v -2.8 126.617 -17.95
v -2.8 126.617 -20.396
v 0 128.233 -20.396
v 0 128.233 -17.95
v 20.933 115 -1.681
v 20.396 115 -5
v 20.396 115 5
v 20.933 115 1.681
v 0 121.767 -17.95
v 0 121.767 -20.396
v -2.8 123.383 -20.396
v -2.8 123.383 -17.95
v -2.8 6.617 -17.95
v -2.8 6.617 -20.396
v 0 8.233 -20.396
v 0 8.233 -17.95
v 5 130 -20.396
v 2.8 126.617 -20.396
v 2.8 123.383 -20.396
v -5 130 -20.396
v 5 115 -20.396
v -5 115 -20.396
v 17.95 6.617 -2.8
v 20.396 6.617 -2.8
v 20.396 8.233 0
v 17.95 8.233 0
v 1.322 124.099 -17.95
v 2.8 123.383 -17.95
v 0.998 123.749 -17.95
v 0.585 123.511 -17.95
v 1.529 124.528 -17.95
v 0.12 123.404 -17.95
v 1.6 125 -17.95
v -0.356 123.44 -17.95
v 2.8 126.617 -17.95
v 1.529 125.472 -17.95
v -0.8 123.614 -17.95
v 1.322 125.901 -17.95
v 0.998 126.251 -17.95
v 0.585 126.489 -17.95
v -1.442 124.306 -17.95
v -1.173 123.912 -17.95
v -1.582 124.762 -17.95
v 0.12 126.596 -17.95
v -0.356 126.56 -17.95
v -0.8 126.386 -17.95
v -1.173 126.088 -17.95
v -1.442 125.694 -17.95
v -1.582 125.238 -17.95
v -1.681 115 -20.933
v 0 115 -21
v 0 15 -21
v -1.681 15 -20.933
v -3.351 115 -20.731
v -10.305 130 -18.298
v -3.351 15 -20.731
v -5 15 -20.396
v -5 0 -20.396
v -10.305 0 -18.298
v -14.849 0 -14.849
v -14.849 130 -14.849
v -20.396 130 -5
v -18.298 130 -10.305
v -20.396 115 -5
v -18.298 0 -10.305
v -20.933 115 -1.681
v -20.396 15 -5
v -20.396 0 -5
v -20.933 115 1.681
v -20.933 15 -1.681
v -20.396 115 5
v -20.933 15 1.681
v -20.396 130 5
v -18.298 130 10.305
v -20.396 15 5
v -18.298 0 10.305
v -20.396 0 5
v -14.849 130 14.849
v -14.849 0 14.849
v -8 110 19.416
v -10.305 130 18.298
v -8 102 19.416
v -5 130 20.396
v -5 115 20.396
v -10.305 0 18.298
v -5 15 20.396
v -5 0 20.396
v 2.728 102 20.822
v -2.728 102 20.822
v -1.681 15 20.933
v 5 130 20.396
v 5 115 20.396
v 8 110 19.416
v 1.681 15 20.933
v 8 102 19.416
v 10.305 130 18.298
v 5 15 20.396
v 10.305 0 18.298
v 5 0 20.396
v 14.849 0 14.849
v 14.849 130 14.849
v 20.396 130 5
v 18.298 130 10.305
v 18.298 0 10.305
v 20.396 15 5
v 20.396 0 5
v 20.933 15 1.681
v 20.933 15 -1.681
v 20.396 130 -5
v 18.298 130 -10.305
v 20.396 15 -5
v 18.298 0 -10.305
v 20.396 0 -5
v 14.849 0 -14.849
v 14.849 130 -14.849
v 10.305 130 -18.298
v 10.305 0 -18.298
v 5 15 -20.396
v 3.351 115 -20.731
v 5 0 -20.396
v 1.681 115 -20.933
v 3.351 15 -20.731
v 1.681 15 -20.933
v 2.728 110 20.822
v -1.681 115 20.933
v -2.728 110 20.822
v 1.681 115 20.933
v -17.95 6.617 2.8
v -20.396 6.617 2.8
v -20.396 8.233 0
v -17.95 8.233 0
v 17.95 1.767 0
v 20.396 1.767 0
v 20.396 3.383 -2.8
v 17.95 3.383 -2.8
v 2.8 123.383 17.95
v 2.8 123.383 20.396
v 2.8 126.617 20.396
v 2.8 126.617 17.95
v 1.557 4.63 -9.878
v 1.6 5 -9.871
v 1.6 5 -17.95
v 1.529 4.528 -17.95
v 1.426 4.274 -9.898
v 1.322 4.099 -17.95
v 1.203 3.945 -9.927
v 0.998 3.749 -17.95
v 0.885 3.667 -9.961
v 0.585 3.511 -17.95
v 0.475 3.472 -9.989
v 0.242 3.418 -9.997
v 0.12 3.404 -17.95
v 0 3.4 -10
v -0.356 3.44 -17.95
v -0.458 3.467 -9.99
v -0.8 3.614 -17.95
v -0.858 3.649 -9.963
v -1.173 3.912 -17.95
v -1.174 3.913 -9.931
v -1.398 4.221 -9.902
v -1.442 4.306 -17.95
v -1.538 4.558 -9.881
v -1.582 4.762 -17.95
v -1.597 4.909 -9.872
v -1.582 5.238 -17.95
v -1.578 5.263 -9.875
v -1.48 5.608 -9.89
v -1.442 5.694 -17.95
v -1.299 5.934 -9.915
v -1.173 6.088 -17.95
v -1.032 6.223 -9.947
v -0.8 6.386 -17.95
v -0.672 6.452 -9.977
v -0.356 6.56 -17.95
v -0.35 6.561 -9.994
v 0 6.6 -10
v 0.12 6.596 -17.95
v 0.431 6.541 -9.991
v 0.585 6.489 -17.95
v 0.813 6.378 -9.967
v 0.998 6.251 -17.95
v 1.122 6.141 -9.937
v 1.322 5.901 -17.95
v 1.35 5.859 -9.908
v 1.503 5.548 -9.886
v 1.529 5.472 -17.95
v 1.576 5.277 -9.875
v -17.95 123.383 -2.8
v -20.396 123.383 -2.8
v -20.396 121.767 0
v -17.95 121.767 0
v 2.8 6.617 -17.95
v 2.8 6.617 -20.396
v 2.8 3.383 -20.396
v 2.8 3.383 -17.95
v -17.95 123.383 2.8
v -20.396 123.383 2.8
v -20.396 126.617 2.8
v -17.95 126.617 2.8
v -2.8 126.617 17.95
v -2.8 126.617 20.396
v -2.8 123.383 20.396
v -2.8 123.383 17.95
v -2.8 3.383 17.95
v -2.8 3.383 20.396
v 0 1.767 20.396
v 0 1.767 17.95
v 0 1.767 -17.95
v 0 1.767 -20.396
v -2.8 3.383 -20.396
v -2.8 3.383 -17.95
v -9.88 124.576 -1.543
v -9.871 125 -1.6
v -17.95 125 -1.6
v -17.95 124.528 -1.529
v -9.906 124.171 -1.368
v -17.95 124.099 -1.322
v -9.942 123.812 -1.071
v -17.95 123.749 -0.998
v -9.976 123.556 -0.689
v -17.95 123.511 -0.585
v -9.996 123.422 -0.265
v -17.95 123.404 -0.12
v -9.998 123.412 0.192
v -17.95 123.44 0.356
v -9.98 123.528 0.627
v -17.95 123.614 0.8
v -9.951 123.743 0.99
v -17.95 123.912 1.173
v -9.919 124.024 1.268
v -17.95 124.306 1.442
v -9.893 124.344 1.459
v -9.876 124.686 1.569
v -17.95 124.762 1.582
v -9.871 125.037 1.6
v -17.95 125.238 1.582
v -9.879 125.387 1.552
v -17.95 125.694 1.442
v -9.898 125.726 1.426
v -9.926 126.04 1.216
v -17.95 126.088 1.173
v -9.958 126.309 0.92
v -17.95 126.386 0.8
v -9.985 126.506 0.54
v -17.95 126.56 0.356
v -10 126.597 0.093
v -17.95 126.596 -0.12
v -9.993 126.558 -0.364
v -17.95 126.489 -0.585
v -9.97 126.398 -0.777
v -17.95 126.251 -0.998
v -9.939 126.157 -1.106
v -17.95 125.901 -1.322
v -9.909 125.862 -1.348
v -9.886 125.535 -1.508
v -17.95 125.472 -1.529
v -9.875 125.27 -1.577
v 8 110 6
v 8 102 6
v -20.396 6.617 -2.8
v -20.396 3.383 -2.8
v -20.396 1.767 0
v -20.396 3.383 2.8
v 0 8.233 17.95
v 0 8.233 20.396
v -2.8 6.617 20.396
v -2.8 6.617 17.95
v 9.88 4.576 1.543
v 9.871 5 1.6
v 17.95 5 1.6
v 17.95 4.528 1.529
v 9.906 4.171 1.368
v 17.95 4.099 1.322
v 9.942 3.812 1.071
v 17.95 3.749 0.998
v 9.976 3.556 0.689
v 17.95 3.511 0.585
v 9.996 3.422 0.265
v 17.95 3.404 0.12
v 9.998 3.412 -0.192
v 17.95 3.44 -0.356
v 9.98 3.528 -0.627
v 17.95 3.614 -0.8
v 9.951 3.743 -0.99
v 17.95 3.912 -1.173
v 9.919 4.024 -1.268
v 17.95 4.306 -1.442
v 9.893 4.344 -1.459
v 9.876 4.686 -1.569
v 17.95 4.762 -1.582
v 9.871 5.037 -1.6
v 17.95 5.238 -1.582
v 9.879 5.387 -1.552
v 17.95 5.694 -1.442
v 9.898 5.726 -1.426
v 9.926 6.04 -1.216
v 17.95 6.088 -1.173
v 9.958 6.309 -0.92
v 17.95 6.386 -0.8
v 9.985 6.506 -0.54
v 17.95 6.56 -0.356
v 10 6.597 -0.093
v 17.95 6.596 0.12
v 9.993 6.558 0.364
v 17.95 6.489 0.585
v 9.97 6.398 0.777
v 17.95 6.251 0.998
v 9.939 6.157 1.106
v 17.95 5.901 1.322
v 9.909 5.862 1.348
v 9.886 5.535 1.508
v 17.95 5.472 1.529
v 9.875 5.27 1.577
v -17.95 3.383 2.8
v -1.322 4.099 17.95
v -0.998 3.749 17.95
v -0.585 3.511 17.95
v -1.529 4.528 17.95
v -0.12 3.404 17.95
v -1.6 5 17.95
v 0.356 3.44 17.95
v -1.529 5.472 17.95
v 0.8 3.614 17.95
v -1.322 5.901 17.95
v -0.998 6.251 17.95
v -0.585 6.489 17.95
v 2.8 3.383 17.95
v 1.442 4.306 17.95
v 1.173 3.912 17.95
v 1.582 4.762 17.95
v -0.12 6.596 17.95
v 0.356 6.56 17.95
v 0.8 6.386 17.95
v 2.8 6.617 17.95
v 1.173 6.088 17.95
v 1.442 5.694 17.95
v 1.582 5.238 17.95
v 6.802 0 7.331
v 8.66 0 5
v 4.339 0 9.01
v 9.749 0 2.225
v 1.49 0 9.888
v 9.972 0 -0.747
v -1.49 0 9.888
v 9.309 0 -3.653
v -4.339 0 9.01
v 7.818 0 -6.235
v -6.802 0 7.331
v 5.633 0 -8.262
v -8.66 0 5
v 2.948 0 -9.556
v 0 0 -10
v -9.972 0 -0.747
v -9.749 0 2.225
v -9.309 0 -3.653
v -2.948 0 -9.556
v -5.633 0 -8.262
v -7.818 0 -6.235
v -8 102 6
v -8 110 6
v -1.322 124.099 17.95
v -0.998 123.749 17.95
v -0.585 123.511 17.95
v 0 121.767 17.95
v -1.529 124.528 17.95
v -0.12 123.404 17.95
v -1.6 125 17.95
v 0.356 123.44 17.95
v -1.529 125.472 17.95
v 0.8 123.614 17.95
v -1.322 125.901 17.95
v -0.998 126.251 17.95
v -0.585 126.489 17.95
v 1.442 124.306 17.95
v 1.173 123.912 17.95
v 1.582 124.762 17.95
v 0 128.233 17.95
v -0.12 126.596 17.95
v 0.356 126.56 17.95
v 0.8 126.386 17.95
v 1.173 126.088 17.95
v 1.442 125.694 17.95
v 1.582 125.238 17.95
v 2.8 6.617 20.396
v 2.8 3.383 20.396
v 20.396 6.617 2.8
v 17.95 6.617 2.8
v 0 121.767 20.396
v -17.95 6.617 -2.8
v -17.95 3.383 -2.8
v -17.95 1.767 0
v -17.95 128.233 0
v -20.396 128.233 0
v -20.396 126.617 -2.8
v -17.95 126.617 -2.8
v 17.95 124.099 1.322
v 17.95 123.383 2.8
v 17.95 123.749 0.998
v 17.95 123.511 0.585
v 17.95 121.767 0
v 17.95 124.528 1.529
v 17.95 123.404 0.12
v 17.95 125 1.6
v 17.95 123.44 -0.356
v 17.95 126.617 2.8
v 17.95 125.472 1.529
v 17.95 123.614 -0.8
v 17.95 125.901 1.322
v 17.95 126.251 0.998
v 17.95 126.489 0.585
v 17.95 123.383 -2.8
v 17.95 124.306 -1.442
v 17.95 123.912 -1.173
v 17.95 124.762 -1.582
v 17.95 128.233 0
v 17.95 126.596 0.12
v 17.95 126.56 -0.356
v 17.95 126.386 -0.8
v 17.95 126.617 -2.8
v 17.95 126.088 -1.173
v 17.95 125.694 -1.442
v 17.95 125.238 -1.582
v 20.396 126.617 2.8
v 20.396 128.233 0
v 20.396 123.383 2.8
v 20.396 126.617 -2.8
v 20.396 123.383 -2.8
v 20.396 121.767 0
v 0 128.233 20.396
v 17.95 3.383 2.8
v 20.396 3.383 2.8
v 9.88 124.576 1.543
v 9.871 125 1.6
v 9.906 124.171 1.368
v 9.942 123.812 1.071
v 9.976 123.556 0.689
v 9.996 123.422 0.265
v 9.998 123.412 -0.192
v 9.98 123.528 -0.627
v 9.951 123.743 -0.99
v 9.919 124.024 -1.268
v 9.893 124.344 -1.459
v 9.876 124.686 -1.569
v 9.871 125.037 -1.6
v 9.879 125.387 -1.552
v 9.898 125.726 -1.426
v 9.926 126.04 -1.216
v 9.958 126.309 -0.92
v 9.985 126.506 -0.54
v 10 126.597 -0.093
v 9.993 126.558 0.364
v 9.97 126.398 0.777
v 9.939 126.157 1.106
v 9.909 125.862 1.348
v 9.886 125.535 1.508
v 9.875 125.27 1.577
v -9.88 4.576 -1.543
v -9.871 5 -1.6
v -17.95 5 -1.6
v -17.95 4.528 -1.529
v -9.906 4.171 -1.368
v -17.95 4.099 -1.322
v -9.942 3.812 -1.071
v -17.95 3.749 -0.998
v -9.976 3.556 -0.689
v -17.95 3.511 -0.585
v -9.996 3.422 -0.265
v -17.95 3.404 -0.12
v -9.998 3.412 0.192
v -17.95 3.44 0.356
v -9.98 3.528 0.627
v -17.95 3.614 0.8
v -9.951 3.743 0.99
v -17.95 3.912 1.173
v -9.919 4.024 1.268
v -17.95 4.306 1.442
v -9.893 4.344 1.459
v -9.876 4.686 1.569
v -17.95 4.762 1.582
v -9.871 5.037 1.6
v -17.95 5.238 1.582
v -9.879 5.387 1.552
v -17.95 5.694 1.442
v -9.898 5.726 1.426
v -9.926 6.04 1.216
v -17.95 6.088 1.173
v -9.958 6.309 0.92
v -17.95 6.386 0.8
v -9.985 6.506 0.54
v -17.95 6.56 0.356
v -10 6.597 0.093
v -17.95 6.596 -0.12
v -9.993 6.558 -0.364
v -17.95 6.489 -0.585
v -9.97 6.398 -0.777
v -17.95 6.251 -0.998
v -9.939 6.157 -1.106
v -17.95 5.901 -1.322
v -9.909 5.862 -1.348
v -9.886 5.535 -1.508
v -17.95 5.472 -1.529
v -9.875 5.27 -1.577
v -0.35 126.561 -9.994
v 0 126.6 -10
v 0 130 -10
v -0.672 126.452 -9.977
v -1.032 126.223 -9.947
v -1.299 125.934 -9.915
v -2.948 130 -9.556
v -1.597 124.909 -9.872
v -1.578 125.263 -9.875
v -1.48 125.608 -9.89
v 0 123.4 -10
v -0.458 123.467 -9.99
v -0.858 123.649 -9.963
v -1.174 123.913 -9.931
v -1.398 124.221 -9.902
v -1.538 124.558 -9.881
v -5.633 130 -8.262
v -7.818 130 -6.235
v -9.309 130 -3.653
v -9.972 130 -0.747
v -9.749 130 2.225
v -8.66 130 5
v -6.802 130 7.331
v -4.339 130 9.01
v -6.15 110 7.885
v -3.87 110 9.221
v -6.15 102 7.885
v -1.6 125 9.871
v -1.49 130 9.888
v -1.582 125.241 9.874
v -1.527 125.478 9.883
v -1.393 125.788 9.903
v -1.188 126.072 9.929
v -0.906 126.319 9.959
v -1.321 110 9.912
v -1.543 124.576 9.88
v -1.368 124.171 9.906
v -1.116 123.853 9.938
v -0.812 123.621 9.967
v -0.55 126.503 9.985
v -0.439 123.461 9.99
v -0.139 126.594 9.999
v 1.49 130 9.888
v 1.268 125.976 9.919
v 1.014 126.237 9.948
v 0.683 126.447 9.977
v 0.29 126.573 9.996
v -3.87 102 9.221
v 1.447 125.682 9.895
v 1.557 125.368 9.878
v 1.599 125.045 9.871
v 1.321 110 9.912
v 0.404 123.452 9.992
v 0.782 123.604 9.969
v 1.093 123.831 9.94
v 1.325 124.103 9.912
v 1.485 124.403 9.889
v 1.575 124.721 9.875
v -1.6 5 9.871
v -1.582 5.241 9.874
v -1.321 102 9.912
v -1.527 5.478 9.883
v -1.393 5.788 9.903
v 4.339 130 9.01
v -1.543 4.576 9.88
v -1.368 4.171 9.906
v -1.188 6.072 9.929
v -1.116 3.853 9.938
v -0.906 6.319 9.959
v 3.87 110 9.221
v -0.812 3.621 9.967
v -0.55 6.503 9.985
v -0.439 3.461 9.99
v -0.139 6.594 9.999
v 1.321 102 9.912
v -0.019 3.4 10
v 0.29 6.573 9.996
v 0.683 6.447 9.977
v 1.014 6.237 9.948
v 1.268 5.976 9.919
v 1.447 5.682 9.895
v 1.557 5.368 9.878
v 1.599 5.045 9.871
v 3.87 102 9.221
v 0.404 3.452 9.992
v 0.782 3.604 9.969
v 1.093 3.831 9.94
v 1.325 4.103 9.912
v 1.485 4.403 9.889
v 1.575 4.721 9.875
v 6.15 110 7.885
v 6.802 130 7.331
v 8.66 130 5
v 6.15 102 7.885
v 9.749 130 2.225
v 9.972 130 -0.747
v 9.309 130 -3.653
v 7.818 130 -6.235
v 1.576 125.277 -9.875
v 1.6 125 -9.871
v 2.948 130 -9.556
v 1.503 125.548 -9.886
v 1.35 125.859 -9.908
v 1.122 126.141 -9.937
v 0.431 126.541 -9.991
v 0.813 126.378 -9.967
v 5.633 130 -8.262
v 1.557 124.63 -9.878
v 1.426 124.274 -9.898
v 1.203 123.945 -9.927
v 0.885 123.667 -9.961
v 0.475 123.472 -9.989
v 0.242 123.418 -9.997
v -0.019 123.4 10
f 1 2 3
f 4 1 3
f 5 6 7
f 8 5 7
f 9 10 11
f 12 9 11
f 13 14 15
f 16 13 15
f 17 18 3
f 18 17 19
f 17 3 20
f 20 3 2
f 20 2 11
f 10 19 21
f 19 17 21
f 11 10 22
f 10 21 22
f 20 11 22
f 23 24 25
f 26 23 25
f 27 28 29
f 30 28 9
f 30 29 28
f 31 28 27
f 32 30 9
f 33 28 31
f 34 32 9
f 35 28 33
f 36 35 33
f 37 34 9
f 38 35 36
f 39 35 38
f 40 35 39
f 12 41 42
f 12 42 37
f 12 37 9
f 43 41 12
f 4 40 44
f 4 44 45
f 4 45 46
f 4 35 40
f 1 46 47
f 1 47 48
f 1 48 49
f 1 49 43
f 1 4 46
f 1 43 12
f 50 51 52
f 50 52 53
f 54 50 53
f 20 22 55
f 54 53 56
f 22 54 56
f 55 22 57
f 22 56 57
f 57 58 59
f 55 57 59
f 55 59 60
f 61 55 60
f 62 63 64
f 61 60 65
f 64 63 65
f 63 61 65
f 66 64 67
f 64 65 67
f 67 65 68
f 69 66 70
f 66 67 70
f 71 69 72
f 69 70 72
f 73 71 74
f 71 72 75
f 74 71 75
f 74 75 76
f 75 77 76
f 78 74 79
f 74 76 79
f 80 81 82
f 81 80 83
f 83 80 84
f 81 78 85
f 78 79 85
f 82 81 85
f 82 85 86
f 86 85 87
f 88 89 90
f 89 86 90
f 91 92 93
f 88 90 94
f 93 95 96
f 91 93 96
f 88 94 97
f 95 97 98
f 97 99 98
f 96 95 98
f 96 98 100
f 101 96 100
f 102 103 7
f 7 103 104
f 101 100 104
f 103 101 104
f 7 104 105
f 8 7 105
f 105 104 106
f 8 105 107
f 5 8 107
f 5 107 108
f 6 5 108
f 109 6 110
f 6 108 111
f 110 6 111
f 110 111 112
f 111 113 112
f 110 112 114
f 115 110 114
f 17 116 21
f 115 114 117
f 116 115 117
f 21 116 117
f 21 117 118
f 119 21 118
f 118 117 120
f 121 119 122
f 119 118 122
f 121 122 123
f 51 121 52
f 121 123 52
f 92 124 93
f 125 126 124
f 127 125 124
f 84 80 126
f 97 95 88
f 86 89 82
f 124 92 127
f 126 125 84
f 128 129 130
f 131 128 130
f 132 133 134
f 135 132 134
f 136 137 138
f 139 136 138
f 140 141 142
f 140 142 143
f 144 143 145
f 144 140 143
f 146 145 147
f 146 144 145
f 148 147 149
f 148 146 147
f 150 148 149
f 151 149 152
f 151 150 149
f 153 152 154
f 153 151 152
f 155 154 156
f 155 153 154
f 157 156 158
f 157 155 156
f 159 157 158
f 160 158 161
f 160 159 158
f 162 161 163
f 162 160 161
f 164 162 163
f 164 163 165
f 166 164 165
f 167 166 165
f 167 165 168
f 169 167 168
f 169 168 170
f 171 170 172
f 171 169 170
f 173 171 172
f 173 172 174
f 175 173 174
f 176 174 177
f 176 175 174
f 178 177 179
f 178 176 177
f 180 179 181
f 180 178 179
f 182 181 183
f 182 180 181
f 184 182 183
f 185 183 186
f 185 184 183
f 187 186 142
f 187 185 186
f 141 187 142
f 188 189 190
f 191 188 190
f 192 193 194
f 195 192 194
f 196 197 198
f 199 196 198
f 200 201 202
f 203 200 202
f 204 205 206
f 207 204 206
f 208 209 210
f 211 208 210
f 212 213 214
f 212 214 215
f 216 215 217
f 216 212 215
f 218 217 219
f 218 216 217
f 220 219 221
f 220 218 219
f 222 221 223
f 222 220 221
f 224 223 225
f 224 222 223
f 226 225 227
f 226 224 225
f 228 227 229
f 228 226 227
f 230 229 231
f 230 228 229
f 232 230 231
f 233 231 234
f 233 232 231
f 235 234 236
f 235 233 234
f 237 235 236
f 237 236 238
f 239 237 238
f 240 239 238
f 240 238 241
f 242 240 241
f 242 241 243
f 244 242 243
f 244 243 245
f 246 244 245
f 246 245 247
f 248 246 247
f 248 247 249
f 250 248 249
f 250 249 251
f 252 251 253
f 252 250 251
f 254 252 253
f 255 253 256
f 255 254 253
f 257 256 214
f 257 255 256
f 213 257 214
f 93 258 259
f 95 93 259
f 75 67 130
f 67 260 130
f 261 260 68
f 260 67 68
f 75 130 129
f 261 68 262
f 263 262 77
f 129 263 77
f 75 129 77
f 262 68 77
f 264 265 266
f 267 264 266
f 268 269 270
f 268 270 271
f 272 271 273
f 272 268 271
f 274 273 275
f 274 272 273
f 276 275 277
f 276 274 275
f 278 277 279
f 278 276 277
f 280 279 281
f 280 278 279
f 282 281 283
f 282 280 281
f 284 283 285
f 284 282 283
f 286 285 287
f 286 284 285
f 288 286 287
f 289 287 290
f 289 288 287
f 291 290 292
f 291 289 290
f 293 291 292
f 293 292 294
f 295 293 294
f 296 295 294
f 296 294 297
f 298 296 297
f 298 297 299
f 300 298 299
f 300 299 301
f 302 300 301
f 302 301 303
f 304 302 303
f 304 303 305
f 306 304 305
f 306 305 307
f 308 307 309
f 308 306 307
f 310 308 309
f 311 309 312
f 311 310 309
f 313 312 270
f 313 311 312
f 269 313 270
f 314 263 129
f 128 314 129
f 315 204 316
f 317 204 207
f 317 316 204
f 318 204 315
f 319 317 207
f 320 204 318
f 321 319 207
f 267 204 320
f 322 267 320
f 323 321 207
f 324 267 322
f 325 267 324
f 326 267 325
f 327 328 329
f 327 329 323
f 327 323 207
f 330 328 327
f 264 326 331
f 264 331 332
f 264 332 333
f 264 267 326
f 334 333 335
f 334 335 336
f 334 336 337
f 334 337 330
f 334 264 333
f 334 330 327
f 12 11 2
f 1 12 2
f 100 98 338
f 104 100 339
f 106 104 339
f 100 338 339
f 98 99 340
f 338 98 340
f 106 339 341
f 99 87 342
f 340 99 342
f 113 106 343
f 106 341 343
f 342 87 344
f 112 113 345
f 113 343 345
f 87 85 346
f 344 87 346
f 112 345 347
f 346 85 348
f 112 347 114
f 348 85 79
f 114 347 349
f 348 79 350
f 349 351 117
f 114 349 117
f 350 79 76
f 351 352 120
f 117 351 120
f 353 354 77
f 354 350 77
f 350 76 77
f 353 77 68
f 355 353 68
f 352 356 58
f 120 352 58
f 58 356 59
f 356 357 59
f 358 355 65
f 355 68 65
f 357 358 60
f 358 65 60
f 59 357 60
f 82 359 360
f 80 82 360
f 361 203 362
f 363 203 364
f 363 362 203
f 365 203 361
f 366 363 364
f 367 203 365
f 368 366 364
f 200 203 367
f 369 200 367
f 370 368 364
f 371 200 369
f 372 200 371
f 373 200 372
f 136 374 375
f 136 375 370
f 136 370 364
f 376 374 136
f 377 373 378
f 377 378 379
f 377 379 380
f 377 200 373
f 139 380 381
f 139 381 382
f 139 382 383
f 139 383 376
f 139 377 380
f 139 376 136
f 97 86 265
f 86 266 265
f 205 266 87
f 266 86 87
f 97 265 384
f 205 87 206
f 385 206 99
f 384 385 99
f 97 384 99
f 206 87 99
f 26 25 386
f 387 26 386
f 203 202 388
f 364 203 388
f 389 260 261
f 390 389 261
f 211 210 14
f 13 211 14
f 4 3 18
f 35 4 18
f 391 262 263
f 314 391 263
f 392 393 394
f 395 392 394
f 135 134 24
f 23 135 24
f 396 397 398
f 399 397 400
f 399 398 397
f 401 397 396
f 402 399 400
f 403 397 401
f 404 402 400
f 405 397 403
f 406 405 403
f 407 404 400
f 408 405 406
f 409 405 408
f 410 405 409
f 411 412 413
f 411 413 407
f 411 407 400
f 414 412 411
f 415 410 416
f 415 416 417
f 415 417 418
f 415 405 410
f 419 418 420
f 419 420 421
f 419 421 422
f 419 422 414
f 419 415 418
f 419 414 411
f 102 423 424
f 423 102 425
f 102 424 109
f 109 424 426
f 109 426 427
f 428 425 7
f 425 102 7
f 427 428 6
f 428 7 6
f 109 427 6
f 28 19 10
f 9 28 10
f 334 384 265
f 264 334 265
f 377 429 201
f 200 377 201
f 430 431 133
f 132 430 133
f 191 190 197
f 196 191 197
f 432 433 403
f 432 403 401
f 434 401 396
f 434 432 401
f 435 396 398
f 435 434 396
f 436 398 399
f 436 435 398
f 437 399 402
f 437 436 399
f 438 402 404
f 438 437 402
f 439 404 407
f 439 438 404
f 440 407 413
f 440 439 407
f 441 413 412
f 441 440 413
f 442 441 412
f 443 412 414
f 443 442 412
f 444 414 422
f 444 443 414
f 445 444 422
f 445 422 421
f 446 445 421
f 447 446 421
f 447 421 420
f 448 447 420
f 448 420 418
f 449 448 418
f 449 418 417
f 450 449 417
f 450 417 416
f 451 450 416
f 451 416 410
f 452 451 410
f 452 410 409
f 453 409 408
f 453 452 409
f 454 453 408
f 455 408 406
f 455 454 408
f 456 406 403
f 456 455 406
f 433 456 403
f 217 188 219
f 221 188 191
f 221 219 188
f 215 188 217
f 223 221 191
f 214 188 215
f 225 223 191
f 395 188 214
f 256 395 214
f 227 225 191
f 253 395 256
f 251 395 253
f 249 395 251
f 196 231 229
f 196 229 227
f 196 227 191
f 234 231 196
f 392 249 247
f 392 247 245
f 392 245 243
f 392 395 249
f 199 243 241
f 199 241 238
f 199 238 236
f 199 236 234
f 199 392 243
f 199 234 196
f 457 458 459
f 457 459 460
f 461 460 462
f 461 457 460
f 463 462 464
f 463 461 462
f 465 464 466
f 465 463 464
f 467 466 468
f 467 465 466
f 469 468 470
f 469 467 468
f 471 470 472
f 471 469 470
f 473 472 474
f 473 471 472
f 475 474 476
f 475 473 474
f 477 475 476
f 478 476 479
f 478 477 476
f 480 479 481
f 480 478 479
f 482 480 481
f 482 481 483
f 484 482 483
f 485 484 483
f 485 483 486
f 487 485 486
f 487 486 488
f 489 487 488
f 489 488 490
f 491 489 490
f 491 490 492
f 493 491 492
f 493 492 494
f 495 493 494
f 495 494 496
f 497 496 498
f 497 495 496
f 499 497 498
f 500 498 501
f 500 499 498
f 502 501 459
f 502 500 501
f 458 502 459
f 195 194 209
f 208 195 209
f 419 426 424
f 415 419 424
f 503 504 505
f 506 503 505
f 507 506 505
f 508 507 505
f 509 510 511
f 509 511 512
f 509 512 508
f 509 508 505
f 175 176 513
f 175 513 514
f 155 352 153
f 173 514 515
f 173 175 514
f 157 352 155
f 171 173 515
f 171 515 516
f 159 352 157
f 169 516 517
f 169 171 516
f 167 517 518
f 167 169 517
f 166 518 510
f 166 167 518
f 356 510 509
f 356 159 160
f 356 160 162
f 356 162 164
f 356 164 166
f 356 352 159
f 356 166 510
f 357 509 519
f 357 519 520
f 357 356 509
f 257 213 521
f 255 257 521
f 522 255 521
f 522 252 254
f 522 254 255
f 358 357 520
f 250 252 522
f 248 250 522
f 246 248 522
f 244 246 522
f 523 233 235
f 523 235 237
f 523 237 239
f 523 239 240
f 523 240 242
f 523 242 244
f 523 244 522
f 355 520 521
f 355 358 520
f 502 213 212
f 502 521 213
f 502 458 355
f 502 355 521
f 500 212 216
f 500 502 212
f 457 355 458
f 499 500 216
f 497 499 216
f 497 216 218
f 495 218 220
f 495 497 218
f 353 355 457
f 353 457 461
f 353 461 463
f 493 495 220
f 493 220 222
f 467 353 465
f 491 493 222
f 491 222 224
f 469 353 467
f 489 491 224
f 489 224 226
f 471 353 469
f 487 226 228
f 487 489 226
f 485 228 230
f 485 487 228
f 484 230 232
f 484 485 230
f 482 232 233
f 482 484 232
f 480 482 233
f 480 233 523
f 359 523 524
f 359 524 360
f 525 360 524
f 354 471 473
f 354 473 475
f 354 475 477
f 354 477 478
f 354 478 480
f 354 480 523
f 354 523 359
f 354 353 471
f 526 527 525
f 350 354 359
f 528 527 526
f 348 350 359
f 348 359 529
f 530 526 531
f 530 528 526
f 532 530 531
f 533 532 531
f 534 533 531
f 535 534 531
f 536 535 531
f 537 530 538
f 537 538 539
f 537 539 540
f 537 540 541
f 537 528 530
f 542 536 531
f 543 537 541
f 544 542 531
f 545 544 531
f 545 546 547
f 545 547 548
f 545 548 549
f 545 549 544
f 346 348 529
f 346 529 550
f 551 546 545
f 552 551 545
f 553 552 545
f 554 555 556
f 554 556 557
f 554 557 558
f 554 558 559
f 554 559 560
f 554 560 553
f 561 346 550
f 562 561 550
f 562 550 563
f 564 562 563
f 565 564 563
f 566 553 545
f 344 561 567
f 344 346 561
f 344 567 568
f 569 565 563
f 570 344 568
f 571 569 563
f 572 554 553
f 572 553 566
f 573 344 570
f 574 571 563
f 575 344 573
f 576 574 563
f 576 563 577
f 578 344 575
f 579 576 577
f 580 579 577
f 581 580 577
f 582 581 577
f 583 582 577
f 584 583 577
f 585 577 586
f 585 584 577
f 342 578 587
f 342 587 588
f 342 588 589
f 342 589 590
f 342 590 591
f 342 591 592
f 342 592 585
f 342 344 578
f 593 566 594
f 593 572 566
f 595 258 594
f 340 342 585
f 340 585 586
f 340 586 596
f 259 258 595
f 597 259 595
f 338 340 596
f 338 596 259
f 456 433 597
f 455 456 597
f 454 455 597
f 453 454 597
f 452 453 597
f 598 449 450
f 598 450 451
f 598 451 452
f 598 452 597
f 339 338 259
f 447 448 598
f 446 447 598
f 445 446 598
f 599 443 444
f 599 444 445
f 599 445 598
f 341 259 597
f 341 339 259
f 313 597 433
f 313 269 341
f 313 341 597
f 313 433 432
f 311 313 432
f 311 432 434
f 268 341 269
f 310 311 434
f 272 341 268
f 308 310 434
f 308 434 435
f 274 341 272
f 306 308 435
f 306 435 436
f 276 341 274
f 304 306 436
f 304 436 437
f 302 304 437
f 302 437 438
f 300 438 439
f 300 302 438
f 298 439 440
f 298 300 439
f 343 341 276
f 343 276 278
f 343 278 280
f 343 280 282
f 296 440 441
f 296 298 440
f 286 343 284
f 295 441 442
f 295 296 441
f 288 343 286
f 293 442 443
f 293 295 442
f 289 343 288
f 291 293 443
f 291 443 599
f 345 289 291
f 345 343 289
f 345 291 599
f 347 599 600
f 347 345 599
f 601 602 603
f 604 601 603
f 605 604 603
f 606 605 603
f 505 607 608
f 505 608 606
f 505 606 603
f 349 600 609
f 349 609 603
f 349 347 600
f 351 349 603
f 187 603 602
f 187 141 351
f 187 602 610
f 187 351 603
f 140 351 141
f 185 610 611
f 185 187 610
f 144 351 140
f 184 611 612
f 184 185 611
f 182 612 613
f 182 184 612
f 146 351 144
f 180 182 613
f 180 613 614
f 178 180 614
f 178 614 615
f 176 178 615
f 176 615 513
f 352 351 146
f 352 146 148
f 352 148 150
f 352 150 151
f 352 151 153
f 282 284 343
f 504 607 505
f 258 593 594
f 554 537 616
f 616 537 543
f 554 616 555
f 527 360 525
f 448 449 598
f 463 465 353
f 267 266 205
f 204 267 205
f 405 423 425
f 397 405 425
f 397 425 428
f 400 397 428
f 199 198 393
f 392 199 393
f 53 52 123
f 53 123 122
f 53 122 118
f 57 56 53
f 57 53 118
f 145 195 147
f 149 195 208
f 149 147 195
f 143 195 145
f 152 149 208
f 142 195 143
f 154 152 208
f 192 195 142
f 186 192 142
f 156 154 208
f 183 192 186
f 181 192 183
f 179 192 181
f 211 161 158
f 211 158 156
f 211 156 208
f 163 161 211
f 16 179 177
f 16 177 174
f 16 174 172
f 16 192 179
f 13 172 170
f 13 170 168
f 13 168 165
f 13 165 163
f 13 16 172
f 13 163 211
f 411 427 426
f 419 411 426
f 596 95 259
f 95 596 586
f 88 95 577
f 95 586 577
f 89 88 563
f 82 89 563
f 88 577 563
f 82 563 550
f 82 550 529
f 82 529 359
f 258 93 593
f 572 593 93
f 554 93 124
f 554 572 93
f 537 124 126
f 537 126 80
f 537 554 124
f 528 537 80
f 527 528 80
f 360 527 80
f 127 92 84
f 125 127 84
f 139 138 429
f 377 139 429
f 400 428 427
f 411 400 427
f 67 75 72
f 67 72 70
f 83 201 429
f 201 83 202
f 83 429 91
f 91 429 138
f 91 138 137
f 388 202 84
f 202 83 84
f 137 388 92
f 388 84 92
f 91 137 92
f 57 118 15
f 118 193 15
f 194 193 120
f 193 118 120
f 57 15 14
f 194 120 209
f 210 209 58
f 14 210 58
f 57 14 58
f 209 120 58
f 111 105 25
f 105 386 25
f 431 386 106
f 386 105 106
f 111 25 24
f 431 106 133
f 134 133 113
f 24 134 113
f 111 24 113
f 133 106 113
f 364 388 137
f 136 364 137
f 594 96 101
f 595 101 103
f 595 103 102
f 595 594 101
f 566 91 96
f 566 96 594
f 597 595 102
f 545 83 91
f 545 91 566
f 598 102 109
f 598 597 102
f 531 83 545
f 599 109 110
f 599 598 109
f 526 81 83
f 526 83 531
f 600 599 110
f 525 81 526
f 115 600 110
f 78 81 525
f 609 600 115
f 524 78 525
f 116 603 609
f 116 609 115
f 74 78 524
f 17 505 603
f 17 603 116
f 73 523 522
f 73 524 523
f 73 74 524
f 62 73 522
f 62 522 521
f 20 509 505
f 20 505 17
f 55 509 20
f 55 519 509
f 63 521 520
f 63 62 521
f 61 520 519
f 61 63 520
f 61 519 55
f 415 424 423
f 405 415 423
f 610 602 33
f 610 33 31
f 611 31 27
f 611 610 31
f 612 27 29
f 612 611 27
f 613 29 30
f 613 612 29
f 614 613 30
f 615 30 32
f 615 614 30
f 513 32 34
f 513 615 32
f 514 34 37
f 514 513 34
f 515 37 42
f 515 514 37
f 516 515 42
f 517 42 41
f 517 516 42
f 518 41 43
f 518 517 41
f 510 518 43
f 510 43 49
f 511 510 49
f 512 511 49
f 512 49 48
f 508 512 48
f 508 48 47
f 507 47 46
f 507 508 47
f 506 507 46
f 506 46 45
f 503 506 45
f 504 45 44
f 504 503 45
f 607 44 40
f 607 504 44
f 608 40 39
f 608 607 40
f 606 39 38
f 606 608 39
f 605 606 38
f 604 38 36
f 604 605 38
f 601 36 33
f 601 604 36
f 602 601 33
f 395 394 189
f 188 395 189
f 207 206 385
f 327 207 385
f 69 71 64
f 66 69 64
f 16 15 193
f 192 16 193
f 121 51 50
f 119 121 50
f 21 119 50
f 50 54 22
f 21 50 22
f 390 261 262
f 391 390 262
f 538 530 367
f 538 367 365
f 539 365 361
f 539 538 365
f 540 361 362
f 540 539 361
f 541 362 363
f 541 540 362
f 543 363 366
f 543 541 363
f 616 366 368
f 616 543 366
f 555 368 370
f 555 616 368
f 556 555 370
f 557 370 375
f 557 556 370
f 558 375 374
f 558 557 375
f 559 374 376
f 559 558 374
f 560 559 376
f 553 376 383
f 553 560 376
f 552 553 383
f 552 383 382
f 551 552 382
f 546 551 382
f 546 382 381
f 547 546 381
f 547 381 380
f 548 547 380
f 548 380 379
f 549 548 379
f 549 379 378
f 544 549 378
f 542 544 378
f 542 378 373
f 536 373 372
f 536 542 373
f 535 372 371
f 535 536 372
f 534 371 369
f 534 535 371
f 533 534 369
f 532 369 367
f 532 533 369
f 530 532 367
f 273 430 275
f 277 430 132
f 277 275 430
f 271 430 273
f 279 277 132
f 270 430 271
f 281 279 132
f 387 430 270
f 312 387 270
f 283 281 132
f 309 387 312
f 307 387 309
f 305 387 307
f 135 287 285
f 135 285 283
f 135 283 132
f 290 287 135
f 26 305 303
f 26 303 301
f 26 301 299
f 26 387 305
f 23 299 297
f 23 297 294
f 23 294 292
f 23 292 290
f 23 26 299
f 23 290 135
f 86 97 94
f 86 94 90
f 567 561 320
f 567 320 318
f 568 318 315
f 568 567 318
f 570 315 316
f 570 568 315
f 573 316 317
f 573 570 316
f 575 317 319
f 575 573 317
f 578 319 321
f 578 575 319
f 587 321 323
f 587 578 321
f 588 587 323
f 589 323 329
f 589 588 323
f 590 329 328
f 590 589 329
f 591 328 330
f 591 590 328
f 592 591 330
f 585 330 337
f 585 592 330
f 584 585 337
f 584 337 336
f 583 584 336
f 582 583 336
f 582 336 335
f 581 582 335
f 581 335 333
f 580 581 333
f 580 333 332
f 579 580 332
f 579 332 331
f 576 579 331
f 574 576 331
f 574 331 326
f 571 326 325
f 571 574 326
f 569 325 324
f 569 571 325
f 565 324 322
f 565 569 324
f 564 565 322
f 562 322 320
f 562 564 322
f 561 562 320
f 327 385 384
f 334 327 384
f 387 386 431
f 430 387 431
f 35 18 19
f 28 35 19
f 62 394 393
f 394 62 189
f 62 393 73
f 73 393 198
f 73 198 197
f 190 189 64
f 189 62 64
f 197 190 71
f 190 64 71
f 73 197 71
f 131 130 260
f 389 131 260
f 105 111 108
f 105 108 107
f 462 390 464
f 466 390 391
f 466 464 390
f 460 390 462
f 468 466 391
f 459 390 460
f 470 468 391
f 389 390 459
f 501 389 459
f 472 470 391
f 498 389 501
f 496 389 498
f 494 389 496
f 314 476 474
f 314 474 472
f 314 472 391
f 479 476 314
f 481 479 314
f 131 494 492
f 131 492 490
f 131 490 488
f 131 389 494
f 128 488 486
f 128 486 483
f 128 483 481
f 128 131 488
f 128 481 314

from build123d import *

# Parameters (mm, degrees)
SKETCH_1_R               = 21
SKETCH_1_R_2             = 10
EXTRUDE_1_DEPTH          = 45
SKETCH_4_R               = 21
SKETCH_4_R_2             = 10
EXTRUDE_2_DEPTH          = 85
CUT_EXTRUDE_3_DEPTH      = 15
CUT_EXTRUDE_START        = -15
CUT_EXTRUDE_4_DEPTH      = 15
CUT_EXTRUDE_6_DEPTH      = 25
CUT_EXTRUDE_START_2      = 20.4
CUT_EXTRUDE_7_DEPTH      = 2.45
PATTERN_CIRCULAR_1_COUNT = 4
SKETCH_14_R              = 1.6
CUT_EXTRUDE_8_DEPTH      = 22.45
PATTERN_CIRCULAR_2_COUNT = 4


with BuildPart() as part:
    # 草图1 → 凸台-拉伸1 (new body)
    with BuildSketch(Plane(origin=(0, 0, 0), x_dir=(1, 0, 0), z_dir=(0, 1, 0))):
        with Locations(Location((0, 0, 0), (0, 0, 90))):
            Circle(SKETCH_1_R)
        with Locations(Location((0, 0, 0), (0, 0, 90))):
            Circle(SKETCH_1_R_2, mode=Mode.SUBTRACT)
    extrude(amount=EXTRUDE_1_DEPTH)

    # 草图4 → 凸台-拉伸2 (add)
    with BuildSketch(Plane(origin=(0, 45, 0), x_dir=(1, 0, 0), z_dir=(0, 1, 0))):
        with Locations(Location((0, 0, 0), (0, 0, 90))):
            Circle(SKETCH_4_R)
        with Locations(Location((0, 0, 0), (0, 0, 90))):
            Circle(SKETCH_4_R_2, mode=Mode.SUBTRACT)
    extrude(amount=EXTRUDE_2_DEPTH)

    # 草图11 → 切除-拉伸3 (cut)
    with BuildSketch(Plane(origin=(0, 0, 0), x_dir=(1, 0, 0), z_dir=(0, 1, 0))):
        with BuildLine():
            Line((-20.396078054, 5), (-20.396078054, -5))
            ThreePointArc((-20.396078054, -5), (-21, 0), (-20.396078054, 5))
        make_face()
        with BuildLine():
            Line((-5, -20.396078054), (5, -20.396078054))
            ThreePointArc((5, -20.396078054), (0, -21), (-5, -20.396078054))
        make_face()
        with BuildLine():
            Line((20.396078054, -5), (20.396078054, 5))
            ThreePointArc((20.396078054, 5), (21, 0), (20.396078054, -5))
        make_face()
        with BuildLine():
            Line((5, 20.396078054), (-5, 20.396078054))
            ThreePointArc((-5, 20.396078054), (0, 21), (5, 20.396078054))
        make_face()
    extrude(amount=CUT_EXTRUDE_3_DEPTH, mode=Mode.SUBTRACT)

    # 草图5 → 切除-拉伸4 (cut)
    with BuildSketch(Plane(origin=(0, 130, 0), x_dir=(1, 0, 0), z_dir=(0, 1, 0)).offset(CUT_EXTRUDE_START)):
        with BuildLine():
            Line((-20.396078054, 5), (-20.396078054, -5))
            ThreePointArc((-20.396078054, -5), (-21, 0), (-20.396078054, 5))
        make_face()
        with BuildLine():
            Line((-5, -20.396078054), (5, -20.396078054))
            ThreePointArc((5, -20.396078054), (0, -21), (-5, -20.396078054))
        make_face()
        with BuildLine():
            Line((20.396078054, -5), (20.396078054, 5))
            ThreePointArc((20.396078054, 5), (21, 0), (20.396078054, -5))
        make_face()
        with BuildLine():
            Line((5, 20.396078054), (-5, 20.396078054))
            ThreePointArc((-5, 20.396078054), (0, 21), (5, 20.396078054))
        make_face()
    extrude(amount=CUT_EXTRUDE_4_DEPTH, mode=Mode.SUBTRACT)

    # 草图12 → 切除-拉伸6 (cut)
    with BuildSketch(Plane.XY):
        Polygon((0, 110), (8, 110), (8, 102), (-8, 102), (-8, 110), align=None)
    extrude(amount=CUT_EXTRUDE_6_DEPTH, mode=Mode.SUBTRACT)

    # 草图13 → 切除-拉伸7 (cut)
    with BuildSketch(Plane(origin=(0, 0, 0), x_dir=(0, 0, -1), z_dir=(1, 0, 0)).offset(CUT_EXTRUDE_START_2)):
        Polygon((0, 128.233161507), (-2.8, 126.616580754), (-2.8, 123.383419246), (0, 121.766838493), (2.8, 123.383419246), (2.8, 126.616580754), align=None)
        Polygon((0, 8.233161507), (-2.8, 6.616580754), (-2.8, 3.383419246), (0, 1.766838493), (2.8, 3.383419246), (2.8, 6.616580754), align=None)
    cut_extrude_7 = extrude(amount=-CUT_EXTRUDE_7_DEPTH, mode=Mode.SUBTRACT)

    # 阵列(圆周)1: 切除-拉伸7 ×4 about axis
    pattern_circular_1_axis = Axis((0, 0, 0), (0, 1, 0))
    for i in range(1, PATTERN_CIRCULAR_1_COUNT):
        add(cut_extrude_7.rotate(pattern_circular_1_axis, i * 360 / PATTERN_CIRCULAR_1_COUNT), mode=Mode.SUBTRACT)

    # 草图14 → 切除-拉伸8 (cut)
    with BuildSketch(Plane(origin=(0, 0, 0), x_dir=(0, 0, -1), z_dir=(1, 0, 0))):
        with Locations(Location((0, 125, 0), (0, 0, 180))):
            Circle(SKETCH_14_R)
        with Locations(Location((0, 5, 0), (0, 0, 180))):
            Circle(SKETCH_14_R)
    cut_extrude_8 = extrude(amount=CUT_EXTRUDE_8_DEPTH, mode=Mode.SUBTRACT)

    # 阵列(圆周)2: 切除-拉伸8 ×4 about axis
    pattern_circular_2_axis = Axis((0, 45, 0), (0, -1, 0))
    for i in range(1, PATTERN_CIRCULAR_2_COUNT):
        add(cut_extrude_8.rotate(pattern_circular_2_axis, i * 360 / PATTERN_CIRCULAR_2_COUNT), mode=Mode.SUBTRACT)


solid = part.part
